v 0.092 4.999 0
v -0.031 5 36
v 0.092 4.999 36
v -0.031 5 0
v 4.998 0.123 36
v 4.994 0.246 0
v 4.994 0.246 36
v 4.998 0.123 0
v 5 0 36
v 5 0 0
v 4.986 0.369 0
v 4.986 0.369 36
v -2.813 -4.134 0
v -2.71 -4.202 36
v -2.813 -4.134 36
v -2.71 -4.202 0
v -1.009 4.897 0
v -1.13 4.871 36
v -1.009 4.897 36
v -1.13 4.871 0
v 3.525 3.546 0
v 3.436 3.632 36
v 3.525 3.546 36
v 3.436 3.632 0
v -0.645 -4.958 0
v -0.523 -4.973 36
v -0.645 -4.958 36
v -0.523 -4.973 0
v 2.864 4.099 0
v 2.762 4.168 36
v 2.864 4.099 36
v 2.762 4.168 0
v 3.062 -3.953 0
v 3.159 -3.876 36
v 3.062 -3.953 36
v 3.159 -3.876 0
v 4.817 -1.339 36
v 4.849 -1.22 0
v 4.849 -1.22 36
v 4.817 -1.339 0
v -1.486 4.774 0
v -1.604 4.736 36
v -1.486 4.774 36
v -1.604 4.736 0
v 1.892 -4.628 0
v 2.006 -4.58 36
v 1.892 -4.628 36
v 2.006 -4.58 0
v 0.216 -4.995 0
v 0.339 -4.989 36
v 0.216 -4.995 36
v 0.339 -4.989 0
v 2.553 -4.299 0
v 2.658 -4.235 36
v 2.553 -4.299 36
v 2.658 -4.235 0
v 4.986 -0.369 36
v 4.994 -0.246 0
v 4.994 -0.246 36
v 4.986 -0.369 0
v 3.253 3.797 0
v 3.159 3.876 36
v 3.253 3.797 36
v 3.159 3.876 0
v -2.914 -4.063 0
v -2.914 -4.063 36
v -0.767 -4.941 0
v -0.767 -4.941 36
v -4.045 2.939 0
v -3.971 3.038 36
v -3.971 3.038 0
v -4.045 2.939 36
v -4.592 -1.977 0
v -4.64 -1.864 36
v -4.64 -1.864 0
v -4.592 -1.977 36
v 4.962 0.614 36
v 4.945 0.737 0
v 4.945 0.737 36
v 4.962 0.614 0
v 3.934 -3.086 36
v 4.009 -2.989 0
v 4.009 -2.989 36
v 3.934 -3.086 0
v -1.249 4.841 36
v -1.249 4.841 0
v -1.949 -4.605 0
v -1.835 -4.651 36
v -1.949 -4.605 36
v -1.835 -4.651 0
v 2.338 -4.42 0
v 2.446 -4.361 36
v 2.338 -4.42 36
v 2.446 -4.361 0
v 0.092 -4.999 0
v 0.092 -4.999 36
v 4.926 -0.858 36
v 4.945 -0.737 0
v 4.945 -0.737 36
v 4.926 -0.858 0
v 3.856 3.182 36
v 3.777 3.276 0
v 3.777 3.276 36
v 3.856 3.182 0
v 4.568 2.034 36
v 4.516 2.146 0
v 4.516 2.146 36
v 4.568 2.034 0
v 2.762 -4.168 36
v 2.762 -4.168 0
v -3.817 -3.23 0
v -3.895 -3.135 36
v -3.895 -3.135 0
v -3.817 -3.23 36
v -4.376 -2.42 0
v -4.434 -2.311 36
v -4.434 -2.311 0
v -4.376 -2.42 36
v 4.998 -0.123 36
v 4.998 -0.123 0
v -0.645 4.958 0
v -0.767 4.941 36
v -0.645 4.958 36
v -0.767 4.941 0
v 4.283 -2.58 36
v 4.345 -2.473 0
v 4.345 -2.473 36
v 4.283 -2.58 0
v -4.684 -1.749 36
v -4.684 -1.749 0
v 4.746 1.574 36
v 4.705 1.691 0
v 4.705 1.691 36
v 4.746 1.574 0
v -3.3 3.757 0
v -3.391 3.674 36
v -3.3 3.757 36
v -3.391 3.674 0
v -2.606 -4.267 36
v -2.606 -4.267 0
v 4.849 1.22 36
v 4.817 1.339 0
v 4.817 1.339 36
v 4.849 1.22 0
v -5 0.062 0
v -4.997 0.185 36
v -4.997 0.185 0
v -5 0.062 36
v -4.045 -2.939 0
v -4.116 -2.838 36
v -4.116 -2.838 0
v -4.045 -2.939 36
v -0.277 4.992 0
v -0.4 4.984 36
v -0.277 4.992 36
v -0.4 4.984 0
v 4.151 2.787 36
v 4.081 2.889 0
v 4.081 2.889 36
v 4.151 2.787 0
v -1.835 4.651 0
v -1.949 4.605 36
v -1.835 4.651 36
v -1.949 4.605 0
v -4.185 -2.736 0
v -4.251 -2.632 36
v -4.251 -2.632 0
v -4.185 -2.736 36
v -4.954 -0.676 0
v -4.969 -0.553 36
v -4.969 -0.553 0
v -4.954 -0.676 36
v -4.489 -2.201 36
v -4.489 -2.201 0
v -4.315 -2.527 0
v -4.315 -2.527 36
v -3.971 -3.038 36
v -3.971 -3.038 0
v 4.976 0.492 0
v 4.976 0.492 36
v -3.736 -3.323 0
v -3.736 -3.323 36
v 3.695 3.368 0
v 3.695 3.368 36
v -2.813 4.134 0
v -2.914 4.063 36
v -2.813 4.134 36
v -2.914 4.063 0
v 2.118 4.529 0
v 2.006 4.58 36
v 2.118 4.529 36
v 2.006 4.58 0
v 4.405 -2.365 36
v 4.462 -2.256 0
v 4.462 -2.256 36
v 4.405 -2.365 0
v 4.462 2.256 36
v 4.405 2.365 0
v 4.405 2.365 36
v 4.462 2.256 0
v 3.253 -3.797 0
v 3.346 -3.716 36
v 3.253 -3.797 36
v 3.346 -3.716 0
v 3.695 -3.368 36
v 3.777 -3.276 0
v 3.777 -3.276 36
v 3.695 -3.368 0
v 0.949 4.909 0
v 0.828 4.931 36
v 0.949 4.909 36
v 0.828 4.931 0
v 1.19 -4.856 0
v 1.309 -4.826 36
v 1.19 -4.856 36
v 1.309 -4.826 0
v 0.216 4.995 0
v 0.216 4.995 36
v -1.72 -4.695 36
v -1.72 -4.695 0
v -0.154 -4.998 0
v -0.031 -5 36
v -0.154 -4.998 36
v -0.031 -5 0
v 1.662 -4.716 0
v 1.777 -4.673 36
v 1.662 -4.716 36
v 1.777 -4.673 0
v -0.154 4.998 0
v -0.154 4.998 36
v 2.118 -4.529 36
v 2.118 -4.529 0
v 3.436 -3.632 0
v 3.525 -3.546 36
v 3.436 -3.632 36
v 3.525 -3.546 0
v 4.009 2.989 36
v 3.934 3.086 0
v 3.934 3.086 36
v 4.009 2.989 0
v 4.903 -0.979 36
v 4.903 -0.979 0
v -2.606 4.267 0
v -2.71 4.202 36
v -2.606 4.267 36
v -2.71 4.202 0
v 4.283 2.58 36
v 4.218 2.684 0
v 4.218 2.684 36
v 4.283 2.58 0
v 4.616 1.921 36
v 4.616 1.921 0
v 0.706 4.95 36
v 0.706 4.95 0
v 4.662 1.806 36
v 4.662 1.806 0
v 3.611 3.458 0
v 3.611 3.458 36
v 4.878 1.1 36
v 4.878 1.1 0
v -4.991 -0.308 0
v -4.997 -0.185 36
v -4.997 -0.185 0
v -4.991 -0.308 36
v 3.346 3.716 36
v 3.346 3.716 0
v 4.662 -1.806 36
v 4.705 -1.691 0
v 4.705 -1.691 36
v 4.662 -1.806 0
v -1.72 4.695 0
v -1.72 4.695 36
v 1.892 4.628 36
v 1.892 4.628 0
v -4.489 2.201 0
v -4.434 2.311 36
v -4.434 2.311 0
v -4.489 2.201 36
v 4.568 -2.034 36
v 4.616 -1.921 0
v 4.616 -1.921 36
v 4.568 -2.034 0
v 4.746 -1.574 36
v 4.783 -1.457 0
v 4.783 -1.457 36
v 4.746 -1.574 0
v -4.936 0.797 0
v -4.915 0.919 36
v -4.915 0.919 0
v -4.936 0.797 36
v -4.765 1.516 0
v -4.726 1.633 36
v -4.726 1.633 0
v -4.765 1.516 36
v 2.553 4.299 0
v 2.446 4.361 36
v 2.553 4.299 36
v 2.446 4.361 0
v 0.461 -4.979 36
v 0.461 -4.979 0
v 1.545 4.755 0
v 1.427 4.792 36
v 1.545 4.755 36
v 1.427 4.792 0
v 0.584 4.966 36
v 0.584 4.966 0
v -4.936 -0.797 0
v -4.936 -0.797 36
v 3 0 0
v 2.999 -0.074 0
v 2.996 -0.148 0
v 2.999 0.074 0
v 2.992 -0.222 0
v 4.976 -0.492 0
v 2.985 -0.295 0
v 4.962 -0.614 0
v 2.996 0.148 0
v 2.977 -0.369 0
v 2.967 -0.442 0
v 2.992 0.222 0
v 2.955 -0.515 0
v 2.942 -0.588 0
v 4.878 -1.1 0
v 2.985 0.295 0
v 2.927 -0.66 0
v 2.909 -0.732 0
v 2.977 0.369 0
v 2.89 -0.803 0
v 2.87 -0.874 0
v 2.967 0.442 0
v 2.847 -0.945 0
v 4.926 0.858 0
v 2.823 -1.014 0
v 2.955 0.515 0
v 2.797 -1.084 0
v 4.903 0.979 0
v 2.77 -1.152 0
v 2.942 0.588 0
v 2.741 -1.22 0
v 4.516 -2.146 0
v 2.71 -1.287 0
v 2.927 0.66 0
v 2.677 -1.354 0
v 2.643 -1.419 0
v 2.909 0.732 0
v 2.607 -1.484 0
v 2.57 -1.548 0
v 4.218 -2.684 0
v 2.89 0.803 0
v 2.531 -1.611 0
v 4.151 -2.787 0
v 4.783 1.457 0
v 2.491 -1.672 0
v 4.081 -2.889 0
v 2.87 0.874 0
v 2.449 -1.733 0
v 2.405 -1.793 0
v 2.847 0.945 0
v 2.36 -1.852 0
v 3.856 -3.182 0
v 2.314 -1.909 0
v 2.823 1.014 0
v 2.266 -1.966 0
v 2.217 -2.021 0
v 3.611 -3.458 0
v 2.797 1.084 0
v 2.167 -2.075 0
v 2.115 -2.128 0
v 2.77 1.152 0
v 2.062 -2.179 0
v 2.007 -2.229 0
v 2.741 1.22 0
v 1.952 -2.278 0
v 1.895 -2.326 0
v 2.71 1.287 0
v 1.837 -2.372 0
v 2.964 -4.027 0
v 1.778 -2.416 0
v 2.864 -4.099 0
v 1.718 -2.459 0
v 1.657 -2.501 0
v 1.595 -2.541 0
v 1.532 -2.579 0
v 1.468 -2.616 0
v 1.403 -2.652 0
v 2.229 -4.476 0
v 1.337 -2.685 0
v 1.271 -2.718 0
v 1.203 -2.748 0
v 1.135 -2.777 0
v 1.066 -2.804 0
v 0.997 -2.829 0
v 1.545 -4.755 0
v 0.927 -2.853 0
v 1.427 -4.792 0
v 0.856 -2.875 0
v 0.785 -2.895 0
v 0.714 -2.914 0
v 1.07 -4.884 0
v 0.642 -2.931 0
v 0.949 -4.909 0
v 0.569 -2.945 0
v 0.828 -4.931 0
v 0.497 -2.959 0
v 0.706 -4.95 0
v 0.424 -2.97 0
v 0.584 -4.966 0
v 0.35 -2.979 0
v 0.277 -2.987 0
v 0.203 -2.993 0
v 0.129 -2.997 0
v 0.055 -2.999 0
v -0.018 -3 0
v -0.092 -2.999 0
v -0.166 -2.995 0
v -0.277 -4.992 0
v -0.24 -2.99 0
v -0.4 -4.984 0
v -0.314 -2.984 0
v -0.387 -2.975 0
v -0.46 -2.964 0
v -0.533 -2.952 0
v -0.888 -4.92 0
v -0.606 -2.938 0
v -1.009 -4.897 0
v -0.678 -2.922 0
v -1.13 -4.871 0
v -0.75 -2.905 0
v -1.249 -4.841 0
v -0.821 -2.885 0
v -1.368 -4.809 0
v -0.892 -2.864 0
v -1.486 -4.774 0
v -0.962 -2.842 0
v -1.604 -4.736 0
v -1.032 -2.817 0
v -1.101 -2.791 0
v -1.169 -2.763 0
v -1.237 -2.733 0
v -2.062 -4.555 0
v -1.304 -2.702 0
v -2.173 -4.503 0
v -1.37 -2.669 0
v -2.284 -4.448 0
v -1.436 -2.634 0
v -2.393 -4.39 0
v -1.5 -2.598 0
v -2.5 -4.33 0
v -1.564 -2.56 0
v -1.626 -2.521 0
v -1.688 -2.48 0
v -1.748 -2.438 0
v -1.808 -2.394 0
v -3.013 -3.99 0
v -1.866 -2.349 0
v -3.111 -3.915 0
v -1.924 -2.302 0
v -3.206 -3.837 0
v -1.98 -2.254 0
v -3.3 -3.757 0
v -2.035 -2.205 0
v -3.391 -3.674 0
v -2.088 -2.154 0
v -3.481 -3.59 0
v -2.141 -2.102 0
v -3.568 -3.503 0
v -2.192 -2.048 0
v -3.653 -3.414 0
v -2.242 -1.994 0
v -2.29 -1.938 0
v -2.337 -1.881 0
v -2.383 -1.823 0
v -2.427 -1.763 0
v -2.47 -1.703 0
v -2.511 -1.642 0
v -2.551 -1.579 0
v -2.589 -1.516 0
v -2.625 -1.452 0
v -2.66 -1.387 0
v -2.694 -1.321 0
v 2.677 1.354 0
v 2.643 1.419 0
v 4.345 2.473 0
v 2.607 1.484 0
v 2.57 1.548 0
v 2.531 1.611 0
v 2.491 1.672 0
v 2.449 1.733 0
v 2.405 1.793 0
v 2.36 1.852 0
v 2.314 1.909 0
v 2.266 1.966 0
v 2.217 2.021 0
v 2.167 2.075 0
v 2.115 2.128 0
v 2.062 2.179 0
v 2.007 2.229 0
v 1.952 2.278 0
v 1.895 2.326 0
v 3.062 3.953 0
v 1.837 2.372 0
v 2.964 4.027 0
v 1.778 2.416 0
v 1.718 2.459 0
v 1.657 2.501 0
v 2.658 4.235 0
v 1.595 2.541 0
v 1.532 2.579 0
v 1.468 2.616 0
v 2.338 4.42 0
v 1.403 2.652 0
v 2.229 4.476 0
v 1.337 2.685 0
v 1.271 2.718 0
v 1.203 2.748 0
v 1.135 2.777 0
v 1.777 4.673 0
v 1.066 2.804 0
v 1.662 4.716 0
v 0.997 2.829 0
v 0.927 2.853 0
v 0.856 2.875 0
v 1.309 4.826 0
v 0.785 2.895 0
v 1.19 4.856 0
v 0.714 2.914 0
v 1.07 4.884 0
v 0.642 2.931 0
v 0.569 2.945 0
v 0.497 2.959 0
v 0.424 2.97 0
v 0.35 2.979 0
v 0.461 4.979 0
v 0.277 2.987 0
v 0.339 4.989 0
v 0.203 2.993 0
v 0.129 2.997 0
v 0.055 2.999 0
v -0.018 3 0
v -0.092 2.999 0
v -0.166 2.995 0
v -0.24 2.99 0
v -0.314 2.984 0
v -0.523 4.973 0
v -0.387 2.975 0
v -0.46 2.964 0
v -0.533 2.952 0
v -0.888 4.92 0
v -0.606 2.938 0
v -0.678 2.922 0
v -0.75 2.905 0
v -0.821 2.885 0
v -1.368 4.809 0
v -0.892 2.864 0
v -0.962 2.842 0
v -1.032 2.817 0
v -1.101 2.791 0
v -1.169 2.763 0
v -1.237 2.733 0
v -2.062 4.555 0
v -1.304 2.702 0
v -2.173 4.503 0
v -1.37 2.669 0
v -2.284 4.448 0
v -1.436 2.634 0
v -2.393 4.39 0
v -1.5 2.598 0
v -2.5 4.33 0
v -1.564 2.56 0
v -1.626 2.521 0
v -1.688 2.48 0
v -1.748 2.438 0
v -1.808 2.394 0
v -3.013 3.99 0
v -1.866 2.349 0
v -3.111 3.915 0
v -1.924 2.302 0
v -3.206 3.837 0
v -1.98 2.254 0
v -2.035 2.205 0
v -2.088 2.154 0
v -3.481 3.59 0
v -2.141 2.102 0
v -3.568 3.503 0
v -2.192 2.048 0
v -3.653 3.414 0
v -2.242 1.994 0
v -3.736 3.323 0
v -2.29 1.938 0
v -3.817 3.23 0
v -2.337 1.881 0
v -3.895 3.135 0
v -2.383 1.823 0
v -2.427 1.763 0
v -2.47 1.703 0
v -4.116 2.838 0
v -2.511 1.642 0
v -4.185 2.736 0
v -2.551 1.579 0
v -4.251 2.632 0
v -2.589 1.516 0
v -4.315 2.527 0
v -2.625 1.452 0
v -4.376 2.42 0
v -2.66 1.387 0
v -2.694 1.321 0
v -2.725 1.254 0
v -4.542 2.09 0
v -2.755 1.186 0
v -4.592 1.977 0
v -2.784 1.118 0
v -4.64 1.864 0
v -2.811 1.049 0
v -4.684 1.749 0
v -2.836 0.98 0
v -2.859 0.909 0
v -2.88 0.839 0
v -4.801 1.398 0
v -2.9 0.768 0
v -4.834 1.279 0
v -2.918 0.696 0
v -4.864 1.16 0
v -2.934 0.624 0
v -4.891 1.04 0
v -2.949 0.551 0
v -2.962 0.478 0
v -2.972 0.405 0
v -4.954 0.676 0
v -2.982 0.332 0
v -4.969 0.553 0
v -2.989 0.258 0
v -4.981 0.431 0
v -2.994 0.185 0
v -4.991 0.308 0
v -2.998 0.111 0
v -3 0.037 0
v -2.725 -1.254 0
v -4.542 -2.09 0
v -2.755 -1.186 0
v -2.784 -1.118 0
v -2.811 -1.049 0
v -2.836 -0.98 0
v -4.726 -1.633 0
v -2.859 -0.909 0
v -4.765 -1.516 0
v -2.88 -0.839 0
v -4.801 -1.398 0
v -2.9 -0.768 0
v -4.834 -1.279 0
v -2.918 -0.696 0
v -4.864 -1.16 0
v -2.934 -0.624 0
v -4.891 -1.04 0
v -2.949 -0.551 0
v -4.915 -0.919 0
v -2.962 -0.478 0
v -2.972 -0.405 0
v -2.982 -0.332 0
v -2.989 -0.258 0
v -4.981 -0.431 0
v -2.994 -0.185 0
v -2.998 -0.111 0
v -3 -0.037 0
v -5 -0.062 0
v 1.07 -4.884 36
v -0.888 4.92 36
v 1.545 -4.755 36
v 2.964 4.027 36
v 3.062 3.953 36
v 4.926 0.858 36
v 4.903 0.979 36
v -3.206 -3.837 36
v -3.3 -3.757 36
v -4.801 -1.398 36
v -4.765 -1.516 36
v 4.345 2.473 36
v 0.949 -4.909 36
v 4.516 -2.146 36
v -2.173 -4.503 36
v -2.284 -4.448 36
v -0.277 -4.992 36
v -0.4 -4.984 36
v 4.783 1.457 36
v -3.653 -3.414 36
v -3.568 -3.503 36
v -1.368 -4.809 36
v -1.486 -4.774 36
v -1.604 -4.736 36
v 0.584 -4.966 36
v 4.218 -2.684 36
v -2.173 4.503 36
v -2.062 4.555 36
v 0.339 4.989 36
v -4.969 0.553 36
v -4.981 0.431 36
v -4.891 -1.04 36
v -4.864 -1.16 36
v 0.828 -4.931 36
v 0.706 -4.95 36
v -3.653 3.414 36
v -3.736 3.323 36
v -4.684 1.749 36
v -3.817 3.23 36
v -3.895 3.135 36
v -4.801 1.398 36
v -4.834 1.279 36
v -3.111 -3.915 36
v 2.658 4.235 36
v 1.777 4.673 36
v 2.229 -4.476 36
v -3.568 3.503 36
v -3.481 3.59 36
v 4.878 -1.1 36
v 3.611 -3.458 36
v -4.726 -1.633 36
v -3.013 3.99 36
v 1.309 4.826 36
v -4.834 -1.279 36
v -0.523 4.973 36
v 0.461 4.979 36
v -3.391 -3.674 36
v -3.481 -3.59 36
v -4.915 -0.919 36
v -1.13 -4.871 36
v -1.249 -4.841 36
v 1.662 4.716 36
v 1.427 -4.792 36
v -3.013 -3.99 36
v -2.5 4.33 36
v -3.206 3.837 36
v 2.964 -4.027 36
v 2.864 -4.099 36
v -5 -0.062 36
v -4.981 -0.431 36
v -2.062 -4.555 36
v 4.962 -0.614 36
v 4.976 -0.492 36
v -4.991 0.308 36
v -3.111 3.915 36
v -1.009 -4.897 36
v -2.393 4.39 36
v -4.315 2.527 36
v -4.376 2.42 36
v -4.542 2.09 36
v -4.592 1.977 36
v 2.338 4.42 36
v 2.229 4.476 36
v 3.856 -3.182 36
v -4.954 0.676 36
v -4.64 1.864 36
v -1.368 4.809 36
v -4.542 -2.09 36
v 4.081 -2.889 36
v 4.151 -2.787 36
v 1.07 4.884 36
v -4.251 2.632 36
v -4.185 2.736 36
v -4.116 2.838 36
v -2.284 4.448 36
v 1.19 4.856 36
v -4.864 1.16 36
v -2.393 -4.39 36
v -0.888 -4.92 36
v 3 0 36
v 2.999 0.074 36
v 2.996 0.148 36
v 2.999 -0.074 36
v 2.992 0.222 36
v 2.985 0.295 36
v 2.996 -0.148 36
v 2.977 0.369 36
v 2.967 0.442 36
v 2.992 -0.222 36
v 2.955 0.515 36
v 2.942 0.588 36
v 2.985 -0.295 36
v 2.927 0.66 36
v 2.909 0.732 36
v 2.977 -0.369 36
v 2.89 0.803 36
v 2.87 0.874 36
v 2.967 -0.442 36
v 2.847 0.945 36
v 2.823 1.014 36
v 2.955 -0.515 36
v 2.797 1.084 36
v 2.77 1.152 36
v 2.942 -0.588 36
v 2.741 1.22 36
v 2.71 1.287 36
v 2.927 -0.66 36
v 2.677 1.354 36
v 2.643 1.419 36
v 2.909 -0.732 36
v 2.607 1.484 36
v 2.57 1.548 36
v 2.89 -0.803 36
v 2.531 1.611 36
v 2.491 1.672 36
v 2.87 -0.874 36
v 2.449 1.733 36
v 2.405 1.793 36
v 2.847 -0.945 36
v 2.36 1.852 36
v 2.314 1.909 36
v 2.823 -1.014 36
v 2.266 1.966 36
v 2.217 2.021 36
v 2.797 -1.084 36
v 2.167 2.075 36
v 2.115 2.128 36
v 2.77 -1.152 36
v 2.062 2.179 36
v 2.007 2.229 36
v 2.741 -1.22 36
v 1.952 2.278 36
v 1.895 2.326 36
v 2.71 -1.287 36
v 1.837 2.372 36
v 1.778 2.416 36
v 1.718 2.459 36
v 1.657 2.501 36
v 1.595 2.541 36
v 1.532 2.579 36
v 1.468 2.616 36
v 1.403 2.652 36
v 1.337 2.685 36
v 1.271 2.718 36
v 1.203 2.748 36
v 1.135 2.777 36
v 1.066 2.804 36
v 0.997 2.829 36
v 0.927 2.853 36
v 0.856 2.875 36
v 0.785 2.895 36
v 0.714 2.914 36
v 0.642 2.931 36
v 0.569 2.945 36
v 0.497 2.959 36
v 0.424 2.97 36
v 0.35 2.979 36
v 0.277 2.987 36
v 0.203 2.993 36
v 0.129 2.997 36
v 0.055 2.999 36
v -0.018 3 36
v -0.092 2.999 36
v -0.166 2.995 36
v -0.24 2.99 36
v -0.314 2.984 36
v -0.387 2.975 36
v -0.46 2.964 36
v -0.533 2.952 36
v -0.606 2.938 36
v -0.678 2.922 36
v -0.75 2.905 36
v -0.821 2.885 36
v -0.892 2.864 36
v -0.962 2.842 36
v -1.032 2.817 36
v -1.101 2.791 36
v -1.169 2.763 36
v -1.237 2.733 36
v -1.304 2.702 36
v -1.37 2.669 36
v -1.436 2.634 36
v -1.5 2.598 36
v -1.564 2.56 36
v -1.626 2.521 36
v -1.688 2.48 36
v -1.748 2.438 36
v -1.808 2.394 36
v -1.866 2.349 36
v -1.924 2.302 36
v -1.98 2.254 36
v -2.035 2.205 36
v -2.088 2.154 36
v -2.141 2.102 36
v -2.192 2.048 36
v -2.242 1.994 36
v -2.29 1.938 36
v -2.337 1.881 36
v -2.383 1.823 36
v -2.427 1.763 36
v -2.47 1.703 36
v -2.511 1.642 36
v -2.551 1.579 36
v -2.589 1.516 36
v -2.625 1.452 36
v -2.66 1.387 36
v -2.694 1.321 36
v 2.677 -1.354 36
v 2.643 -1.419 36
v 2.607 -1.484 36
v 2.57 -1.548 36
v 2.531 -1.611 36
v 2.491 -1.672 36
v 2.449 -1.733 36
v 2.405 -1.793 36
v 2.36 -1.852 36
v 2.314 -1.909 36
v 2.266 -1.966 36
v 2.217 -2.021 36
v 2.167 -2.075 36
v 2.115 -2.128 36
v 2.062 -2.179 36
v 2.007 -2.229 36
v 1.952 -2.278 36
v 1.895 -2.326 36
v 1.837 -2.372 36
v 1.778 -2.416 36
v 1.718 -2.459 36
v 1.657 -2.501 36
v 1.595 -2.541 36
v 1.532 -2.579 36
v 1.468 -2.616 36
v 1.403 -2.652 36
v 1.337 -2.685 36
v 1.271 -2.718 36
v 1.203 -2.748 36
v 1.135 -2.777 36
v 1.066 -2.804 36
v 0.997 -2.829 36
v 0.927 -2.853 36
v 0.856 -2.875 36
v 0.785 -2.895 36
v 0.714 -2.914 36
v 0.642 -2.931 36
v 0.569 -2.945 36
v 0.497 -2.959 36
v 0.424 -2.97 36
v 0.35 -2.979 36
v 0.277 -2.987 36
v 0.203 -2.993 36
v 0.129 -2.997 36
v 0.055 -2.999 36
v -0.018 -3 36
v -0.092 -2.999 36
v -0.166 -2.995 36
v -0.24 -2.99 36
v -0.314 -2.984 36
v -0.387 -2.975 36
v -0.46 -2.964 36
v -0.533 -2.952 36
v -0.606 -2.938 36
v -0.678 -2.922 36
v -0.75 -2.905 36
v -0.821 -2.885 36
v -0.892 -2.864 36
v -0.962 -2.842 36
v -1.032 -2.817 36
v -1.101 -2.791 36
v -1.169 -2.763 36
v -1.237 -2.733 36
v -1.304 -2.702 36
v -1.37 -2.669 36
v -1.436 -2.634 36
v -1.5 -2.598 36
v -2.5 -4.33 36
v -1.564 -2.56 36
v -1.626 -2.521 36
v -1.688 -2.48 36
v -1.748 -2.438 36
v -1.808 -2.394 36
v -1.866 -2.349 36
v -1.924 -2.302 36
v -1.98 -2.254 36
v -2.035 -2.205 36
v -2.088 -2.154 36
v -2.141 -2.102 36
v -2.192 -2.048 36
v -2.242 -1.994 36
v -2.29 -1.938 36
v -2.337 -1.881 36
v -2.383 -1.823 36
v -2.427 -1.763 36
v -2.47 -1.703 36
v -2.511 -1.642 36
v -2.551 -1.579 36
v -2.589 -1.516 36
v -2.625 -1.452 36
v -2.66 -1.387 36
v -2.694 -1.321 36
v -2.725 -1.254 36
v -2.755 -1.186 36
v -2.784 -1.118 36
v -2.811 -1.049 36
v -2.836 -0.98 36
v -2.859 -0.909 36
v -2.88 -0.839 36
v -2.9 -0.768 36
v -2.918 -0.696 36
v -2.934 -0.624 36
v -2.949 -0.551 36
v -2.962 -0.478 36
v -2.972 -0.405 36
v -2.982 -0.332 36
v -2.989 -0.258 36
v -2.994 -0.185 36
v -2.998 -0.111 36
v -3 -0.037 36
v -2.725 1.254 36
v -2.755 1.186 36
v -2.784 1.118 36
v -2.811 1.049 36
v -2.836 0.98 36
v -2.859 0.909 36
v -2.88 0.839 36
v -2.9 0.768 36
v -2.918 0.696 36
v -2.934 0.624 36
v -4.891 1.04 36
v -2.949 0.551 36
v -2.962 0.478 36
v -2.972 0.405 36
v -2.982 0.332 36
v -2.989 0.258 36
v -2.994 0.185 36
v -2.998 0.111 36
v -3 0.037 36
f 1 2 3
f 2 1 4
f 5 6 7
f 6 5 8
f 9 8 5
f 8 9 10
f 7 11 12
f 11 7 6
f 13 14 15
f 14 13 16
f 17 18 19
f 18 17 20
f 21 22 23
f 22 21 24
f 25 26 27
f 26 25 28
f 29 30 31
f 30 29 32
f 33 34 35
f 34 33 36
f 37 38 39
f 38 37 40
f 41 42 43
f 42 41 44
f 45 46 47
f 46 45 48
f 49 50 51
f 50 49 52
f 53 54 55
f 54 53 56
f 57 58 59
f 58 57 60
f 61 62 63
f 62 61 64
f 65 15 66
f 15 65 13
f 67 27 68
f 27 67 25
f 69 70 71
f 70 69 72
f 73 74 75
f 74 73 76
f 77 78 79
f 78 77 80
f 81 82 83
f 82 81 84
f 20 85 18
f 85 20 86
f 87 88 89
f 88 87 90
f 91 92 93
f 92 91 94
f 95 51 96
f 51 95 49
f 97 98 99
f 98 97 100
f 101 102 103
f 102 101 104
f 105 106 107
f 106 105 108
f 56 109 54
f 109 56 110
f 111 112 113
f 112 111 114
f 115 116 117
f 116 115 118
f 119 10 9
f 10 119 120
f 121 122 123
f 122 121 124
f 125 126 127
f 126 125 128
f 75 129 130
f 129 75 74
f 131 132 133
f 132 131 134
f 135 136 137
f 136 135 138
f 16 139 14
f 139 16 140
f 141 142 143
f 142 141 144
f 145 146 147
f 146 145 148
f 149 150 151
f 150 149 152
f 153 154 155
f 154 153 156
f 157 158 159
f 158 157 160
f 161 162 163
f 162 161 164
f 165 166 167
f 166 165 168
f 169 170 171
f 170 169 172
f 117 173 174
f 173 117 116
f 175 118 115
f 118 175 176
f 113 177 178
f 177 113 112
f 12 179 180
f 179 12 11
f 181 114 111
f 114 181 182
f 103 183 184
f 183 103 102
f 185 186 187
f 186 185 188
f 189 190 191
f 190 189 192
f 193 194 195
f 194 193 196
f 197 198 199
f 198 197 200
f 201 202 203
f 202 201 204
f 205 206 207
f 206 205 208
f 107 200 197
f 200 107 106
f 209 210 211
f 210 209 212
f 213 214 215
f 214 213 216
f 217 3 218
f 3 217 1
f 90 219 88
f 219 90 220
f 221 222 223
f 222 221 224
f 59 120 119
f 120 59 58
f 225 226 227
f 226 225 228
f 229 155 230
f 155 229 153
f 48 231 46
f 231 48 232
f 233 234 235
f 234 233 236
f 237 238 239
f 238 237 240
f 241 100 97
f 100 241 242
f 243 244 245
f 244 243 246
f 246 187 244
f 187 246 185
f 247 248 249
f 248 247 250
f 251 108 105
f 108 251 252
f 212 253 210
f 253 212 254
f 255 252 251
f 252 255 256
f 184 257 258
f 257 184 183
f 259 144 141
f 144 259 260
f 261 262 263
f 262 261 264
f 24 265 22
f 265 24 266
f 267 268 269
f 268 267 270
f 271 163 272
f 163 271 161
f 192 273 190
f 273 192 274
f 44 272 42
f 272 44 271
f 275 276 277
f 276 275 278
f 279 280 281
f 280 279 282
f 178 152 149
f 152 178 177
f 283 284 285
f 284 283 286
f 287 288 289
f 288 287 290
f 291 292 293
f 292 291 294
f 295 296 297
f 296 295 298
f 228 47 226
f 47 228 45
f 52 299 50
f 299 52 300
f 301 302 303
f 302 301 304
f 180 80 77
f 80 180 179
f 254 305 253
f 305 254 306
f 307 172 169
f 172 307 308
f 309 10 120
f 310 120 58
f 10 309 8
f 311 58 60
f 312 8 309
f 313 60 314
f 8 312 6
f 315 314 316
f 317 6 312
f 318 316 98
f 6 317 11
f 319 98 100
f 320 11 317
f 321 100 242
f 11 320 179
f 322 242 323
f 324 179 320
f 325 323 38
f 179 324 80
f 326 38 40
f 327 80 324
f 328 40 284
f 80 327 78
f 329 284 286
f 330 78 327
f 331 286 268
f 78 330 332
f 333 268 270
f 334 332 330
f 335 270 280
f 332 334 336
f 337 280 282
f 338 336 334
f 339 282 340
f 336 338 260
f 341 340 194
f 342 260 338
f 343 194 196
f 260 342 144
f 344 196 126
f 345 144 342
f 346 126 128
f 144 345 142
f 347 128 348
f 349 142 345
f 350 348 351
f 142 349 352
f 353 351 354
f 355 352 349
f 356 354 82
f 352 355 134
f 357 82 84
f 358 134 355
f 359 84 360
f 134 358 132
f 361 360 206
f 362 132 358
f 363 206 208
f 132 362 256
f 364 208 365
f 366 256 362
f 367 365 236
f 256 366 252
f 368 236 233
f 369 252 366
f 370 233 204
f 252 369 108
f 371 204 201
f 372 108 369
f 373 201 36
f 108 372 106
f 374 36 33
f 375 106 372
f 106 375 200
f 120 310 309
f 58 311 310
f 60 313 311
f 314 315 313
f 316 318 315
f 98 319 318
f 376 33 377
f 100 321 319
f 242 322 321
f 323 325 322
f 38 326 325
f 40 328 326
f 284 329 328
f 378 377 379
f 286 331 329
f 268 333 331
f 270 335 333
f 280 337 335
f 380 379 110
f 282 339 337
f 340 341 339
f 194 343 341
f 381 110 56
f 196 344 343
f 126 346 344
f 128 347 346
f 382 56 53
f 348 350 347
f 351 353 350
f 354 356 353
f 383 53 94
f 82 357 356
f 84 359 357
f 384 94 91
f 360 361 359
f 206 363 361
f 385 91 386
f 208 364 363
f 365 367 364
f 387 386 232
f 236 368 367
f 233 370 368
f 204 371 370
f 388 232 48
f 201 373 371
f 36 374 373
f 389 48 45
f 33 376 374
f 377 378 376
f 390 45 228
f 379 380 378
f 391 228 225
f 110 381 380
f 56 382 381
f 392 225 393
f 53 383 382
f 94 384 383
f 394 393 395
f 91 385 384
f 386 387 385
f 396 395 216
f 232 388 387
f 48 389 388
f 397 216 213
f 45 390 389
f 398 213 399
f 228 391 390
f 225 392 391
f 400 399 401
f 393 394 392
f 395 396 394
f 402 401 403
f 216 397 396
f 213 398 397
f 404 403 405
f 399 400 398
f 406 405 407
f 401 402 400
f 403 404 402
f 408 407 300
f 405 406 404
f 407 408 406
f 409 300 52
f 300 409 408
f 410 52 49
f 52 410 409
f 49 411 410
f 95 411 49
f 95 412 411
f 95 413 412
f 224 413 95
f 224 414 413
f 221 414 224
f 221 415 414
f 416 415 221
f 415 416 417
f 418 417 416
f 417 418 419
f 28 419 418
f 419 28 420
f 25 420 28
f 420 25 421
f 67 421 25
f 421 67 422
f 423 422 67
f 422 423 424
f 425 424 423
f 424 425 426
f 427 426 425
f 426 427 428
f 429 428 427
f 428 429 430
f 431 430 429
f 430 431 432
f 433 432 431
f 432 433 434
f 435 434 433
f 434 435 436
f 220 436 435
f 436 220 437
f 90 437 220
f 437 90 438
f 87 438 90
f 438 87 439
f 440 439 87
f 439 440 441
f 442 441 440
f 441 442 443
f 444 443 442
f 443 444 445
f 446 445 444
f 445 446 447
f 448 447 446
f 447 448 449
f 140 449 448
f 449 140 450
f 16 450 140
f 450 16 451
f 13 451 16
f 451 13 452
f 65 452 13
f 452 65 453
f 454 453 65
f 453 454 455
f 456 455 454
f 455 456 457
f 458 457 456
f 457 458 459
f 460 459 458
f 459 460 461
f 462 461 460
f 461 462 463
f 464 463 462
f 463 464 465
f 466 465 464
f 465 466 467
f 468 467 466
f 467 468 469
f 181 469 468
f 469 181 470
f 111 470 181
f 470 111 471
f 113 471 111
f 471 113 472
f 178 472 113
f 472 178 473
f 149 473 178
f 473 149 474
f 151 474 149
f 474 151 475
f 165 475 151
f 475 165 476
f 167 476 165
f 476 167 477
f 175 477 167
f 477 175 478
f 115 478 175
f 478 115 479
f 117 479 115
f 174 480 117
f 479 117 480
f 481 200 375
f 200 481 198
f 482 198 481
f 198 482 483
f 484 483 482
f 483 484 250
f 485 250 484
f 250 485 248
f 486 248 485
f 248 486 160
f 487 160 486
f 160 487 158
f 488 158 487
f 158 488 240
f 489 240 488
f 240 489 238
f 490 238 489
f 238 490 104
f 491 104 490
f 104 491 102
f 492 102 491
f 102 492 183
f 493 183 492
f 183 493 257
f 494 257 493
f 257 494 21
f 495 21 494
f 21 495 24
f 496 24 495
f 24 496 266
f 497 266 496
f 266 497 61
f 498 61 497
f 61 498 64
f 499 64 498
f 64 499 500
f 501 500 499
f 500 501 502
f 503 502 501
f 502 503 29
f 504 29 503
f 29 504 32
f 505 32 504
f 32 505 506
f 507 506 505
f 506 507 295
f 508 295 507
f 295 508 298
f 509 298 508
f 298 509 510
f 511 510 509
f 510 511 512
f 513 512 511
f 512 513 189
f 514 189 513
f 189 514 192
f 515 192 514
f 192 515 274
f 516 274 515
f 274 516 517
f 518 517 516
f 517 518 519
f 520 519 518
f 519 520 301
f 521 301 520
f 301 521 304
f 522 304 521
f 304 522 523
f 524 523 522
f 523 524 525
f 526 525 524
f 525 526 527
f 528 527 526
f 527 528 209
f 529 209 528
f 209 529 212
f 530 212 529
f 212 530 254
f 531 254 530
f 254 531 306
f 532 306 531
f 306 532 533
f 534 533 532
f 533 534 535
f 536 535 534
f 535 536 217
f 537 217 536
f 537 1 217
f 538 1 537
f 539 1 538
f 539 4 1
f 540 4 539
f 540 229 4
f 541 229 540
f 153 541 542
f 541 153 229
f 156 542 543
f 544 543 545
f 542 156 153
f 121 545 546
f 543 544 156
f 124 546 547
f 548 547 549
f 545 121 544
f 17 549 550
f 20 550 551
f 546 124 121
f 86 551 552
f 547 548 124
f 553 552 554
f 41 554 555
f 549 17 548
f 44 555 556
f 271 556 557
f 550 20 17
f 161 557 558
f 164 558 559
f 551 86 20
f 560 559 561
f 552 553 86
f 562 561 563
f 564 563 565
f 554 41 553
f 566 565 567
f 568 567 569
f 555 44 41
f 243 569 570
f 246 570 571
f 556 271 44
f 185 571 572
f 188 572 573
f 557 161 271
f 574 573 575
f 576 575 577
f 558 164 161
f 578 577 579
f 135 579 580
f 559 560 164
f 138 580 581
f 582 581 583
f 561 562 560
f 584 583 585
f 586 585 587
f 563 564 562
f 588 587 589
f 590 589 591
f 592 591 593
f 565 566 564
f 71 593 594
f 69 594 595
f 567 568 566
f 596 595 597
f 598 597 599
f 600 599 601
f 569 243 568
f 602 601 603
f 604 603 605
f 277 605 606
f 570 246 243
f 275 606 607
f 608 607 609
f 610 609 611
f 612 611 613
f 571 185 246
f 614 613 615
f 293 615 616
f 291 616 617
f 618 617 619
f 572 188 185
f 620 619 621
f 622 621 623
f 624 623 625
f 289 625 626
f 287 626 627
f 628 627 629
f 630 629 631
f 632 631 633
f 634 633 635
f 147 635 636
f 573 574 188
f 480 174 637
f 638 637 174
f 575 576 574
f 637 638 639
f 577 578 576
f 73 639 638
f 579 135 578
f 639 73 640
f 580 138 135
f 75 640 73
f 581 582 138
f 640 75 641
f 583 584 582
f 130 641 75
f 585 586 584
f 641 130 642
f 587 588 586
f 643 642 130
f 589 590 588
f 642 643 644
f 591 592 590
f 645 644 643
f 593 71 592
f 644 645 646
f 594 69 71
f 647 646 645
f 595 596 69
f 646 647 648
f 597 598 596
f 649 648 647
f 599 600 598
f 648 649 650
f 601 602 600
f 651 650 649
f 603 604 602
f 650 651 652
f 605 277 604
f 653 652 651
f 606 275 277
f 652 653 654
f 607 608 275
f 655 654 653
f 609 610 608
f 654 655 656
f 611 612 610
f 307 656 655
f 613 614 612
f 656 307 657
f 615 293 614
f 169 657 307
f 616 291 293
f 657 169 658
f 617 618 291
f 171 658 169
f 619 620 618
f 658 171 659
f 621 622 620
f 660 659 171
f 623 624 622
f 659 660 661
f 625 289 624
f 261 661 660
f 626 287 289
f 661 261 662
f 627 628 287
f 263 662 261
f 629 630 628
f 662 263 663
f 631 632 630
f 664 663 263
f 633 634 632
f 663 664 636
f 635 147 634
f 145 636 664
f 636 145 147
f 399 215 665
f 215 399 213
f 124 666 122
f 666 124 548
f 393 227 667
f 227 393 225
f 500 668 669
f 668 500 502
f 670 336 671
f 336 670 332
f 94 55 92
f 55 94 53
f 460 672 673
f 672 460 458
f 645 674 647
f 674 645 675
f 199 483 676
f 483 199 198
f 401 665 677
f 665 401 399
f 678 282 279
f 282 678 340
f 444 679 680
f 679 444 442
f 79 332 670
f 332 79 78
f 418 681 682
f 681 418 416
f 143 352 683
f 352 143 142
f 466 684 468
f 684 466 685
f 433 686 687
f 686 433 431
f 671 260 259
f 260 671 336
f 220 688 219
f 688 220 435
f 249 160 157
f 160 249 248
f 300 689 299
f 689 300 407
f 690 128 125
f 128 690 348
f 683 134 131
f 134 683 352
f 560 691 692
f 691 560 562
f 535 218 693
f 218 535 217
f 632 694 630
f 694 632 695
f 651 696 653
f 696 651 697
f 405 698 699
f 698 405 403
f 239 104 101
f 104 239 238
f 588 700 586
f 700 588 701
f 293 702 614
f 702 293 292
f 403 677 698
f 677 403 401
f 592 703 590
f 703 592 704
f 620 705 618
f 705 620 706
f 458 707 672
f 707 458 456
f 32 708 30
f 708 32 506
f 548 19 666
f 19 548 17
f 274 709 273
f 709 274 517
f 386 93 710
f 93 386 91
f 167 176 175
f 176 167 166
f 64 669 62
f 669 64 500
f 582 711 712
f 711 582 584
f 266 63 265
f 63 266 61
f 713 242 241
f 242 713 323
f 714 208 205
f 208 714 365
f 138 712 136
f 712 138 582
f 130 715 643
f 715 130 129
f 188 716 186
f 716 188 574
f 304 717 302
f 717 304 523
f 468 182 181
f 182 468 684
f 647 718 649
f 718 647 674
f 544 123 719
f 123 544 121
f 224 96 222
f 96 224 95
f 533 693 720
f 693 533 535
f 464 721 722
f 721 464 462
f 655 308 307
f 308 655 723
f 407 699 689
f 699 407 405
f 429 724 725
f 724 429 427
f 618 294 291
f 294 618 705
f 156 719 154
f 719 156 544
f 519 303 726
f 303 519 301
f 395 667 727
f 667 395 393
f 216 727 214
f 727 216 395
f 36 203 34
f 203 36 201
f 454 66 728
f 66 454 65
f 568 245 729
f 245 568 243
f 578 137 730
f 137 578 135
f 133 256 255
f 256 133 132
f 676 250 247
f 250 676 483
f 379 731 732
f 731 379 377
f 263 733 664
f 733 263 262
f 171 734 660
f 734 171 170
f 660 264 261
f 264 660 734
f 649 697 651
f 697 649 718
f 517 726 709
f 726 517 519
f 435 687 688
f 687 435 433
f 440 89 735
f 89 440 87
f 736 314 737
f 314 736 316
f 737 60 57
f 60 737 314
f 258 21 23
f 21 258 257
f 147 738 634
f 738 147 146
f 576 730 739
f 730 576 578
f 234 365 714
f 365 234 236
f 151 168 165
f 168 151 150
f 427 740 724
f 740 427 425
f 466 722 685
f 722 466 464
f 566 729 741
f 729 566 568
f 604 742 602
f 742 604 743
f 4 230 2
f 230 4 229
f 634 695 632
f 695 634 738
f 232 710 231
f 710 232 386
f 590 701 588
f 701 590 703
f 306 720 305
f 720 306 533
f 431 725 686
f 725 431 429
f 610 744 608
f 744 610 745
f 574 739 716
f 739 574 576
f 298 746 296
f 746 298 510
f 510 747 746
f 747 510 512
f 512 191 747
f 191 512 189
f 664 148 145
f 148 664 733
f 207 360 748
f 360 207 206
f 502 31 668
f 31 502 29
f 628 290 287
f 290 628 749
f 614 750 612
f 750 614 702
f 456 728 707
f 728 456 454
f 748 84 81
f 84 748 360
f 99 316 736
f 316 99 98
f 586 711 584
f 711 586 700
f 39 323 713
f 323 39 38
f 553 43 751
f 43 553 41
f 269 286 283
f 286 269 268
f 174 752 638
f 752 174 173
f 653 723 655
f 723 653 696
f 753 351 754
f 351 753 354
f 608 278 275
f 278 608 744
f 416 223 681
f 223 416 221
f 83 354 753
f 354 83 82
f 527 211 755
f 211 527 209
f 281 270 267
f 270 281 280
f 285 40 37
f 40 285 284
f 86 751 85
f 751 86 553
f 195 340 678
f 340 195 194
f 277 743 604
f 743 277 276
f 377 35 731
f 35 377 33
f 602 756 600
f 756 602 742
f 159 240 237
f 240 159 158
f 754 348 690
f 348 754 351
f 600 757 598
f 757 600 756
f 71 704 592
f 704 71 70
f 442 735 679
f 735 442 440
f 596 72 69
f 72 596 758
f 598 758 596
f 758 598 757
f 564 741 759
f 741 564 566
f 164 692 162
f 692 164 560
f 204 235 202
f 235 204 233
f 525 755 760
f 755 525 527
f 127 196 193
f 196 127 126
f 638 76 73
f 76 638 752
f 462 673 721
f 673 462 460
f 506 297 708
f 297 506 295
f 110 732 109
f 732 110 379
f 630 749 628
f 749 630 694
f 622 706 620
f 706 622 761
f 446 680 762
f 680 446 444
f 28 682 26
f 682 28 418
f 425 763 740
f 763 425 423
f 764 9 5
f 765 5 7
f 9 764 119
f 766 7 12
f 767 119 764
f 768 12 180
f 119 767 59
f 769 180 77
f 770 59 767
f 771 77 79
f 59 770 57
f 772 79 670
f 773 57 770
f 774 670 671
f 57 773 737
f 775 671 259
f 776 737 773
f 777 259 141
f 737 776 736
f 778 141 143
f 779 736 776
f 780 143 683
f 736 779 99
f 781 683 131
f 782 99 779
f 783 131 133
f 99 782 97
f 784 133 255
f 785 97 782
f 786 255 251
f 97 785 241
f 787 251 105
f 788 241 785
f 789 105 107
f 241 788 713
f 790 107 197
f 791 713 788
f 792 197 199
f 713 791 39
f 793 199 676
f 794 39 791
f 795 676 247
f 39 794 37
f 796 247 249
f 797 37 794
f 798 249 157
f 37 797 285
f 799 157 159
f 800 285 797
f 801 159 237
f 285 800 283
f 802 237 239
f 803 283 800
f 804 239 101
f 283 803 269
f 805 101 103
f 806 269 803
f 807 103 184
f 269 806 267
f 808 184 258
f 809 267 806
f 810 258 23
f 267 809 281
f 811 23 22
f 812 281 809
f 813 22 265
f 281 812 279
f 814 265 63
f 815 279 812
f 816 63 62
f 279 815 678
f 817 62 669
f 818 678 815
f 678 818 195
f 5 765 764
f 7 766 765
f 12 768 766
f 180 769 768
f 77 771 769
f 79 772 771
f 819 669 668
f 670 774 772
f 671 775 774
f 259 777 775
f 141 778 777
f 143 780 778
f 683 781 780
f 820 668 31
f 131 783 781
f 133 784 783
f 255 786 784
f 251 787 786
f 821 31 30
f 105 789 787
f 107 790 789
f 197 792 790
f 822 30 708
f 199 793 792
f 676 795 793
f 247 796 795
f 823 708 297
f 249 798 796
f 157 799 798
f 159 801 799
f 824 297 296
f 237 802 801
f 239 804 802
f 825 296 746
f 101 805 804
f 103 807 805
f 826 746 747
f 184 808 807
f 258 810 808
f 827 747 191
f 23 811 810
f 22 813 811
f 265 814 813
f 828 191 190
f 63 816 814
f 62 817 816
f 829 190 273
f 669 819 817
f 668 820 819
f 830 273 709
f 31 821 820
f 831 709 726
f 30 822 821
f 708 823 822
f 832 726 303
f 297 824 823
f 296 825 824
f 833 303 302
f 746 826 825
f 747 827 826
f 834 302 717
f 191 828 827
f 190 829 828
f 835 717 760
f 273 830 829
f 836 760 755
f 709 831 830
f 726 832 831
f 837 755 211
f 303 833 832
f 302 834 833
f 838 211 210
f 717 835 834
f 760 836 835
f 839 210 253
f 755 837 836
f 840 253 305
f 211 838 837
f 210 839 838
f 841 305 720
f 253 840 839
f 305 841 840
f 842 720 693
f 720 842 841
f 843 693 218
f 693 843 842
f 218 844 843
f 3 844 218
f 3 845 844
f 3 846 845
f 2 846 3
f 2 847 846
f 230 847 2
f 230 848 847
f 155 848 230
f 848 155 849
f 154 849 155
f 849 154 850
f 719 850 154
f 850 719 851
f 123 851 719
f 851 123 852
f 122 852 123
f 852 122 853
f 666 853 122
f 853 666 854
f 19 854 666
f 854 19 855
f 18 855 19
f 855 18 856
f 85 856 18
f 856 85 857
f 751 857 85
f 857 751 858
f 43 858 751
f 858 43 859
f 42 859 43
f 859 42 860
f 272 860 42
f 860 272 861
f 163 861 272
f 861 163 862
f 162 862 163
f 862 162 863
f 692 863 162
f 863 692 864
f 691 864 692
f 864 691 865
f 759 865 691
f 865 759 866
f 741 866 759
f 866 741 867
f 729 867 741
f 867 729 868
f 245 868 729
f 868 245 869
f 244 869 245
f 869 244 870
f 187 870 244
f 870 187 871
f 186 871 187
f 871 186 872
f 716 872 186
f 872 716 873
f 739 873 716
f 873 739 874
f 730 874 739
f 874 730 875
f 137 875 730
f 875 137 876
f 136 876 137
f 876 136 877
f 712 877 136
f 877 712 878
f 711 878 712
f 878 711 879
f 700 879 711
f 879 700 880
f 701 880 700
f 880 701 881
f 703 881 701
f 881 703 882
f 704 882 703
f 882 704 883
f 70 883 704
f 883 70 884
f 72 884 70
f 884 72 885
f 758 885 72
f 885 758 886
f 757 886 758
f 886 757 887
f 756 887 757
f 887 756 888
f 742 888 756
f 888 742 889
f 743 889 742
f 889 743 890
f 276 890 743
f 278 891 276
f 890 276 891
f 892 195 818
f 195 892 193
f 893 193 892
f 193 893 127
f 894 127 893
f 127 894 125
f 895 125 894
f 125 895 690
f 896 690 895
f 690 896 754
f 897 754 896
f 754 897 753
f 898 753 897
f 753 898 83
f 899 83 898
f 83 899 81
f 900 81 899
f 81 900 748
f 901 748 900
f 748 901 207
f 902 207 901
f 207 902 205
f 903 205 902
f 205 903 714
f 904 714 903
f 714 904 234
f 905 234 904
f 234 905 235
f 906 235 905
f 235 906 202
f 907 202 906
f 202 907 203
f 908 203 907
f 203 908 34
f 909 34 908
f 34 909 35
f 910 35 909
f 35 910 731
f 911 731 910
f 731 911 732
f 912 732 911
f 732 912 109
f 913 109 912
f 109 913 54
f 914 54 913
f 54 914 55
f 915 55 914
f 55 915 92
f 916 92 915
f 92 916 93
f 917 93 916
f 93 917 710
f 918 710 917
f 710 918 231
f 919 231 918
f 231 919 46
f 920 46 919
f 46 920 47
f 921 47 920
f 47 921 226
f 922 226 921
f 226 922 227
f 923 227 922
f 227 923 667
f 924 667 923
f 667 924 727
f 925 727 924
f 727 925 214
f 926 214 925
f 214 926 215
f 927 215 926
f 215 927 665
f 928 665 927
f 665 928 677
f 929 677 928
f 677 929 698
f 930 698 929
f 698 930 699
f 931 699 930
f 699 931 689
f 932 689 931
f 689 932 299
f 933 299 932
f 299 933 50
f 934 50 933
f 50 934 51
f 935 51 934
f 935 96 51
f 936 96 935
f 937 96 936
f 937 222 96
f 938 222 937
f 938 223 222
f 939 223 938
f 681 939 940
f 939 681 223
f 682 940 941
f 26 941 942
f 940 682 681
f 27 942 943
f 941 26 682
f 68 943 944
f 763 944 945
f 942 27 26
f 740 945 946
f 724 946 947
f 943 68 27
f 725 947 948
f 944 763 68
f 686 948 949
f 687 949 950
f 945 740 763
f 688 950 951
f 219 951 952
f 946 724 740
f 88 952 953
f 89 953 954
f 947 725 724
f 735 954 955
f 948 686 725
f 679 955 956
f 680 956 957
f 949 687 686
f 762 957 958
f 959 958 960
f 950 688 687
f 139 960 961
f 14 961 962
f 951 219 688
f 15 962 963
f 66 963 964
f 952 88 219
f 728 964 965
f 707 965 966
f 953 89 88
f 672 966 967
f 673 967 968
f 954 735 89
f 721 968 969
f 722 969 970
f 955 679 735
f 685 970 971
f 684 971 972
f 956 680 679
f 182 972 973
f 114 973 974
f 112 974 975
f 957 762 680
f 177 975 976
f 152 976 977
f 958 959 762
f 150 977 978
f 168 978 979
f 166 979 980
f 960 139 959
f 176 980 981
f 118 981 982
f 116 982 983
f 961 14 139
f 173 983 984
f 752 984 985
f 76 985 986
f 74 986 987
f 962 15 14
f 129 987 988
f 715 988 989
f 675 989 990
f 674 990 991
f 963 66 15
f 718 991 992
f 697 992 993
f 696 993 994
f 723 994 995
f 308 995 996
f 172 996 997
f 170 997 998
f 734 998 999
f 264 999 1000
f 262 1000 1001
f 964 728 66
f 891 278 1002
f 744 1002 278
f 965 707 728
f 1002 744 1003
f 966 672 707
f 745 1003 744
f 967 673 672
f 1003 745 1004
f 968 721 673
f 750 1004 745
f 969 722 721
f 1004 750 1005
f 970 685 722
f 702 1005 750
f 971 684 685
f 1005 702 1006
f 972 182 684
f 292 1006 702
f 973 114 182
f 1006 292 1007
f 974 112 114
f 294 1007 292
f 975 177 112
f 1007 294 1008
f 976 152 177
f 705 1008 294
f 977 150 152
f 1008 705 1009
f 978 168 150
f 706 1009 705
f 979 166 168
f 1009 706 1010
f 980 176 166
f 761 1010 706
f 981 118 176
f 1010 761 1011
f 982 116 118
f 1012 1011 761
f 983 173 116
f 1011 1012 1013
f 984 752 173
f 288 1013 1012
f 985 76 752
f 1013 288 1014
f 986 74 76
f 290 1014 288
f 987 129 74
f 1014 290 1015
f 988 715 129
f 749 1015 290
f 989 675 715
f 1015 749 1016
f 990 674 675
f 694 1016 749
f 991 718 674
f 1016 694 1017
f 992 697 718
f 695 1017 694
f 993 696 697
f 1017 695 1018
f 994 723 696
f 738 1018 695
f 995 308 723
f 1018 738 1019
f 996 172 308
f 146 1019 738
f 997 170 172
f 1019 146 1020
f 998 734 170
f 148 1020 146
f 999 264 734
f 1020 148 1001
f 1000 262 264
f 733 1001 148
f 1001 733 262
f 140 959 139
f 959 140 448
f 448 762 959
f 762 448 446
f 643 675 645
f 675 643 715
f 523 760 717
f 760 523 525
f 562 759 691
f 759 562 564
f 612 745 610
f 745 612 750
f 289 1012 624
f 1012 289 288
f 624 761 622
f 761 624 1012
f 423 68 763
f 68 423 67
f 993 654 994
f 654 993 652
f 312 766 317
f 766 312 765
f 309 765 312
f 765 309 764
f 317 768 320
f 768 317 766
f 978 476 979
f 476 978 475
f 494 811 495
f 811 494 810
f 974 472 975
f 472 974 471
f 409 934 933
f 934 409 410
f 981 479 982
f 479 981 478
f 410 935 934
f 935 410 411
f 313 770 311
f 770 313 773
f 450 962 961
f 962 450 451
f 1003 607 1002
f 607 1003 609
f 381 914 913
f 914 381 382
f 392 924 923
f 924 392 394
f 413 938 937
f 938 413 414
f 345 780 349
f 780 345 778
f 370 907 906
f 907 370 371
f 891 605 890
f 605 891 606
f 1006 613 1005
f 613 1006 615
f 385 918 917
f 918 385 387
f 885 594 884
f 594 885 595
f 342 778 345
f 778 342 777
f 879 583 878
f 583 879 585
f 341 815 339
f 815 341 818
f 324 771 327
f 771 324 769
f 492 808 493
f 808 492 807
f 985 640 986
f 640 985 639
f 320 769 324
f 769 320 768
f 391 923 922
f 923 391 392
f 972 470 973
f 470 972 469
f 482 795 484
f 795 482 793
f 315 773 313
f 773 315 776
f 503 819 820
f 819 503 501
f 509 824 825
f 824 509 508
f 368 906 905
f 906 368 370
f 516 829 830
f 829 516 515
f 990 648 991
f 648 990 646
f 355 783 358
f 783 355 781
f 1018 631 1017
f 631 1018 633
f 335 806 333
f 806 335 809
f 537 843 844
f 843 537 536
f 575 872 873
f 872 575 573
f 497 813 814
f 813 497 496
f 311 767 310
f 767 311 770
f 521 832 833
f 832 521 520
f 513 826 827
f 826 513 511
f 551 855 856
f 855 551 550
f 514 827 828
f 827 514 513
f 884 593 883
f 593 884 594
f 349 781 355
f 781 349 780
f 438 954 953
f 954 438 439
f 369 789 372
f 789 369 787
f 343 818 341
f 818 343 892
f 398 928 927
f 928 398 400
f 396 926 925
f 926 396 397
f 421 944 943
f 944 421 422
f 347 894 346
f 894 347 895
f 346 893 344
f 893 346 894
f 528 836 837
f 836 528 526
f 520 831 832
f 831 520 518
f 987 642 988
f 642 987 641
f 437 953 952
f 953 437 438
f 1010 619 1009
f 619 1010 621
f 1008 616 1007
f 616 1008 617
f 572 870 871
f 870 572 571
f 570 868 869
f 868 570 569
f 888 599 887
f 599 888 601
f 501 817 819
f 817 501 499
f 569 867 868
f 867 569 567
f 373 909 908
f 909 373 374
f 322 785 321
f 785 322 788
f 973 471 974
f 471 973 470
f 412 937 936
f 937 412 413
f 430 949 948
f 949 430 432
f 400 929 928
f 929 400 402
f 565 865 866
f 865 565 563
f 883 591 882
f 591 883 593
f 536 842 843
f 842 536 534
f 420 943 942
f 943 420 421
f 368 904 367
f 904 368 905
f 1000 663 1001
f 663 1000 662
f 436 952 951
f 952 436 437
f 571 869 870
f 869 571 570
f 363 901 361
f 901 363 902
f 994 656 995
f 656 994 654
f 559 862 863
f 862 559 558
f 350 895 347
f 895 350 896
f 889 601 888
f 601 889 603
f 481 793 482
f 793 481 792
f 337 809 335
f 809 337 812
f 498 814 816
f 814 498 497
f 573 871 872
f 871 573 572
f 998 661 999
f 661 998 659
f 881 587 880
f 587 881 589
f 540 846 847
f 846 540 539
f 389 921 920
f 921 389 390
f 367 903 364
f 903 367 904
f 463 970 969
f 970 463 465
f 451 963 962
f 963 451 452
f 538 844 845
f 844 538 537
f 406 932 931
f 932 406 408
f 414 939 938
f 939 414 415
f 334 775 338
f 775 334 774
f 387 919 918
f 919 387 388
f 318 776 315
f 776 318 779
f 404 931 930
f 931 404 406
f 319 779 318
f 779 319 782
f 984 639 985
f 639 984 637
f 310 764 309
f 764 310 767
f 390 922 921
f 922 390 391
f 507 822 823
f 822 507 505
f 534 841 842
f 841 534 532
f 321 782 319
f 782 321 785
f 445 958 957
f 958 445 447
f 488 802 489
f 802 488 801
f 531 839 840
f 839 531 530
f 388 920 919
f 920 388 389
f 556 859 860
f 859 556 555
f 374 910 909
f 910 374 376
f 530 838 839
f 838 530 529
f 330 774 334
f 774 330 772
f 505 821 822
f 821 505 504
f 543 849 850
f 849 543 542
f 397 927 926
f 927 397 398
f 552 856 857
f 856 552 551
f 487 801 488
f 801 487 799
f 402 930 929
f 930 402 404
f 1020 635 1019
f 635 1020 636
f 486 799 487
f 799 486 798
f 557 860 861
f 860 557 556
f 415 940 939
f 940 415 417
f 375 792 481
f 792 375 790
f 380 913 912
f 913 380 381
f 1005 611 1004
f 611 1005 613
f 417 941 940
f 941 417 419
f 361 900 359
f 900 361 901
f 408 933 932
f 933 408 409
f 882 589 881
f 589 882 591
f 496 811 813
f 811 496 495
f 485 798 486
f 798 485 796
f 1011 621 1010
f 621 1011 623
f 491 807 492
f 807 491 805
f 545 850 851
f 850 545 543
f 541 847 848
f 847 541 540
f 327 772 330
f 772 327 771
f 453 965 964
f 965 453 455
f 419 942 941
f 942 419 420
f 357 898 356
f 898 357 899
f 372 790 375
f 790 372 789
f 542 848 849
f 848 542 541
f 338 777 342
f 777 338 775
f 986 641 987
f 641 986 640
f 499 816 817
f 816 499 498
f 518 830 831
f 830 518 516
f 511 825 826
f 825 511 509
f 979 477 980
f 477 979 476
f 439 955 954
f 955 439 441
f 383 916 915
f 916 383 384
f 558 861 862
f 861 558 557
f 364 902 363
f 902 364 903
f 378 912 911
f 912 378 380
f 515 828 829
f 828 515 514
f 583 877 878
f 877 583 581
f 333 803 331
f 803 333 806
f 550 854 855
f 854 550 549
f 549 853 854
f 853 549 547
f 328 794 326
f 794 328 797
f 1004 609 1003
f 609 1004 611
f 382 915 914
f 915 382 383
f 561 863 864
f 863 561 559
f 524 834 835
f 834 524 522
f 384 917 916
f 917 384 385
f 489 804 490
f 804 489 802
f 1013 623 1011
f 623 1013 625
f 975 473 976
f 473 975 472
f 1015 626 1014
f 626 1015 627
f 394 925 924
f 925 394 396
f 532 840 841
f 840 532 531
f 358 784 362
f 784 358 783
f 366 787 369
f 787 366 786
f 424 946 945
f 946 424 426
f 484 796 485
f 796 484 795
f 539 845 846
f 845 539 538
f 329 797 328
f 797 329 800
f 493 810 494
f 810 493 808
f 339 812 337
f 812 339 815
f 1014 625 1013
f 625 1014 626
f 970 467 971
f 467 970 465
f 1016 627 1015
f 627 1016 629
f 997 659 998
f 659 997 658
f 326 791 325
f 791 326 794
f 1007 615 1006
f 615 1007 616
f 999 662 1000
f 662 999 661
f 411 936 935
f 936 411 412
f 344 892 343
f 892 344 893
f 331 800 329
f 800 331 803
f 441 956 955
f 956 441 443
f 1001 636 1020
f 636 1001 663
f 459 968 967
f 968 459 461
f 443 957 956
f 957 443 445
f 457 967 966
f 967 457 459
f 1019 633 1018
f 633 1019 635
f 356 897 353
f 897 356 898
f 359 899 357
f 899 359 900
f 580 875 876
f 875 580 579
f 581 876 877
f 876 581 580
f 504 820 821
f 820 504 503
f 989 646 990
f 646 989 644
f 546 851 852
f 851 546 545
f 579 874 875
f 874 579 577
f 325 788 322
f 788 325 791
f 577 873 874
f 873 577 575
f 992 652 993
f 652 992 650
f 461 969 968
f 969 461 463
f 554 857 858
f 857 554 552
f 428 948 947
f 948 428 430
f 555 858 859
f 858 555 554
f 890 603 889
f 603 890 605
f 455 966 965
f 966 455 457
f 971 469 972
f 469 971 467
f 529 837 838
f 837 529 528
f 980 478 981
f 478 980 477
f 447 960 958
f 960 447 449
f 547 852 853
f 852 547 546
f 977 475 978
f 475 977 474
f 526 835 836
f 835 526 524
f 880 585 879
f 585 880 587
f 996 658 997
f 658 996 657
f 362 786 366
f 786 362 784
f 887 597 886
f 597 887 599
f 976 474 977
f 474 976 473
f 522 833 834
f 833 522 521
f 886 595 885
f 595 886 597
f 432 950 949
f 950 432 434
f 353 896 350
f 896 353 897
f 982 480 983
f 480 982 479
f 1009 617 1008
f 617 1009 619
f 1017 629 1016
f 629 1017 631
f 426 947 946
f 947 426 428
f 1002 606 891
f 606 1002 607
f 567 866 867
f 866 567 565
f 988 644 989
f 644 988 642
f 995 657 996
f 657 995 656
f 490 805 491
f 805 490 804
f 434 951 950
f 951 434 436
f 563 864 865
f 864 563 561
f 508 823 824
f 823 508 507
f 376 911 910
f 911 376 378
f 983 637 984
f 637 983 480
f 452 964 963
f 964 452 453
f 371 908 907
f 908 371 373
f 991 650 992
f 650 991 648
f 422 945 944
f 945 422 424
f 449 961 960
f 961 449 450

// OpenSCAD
$fn=255;

endo_diameter = 6/2;
wall_thickness = 2 + endo_diameter;
height = 36;

module collar(endo_diameter, wall_thickness, height){
	difference(){
		cylinder(height, wall_thickness, wall_thickness);
		cylinder(height, endo_diameter, endo_diameter);
	}
}

collar(endo_diameter, wall_thickness, height);
